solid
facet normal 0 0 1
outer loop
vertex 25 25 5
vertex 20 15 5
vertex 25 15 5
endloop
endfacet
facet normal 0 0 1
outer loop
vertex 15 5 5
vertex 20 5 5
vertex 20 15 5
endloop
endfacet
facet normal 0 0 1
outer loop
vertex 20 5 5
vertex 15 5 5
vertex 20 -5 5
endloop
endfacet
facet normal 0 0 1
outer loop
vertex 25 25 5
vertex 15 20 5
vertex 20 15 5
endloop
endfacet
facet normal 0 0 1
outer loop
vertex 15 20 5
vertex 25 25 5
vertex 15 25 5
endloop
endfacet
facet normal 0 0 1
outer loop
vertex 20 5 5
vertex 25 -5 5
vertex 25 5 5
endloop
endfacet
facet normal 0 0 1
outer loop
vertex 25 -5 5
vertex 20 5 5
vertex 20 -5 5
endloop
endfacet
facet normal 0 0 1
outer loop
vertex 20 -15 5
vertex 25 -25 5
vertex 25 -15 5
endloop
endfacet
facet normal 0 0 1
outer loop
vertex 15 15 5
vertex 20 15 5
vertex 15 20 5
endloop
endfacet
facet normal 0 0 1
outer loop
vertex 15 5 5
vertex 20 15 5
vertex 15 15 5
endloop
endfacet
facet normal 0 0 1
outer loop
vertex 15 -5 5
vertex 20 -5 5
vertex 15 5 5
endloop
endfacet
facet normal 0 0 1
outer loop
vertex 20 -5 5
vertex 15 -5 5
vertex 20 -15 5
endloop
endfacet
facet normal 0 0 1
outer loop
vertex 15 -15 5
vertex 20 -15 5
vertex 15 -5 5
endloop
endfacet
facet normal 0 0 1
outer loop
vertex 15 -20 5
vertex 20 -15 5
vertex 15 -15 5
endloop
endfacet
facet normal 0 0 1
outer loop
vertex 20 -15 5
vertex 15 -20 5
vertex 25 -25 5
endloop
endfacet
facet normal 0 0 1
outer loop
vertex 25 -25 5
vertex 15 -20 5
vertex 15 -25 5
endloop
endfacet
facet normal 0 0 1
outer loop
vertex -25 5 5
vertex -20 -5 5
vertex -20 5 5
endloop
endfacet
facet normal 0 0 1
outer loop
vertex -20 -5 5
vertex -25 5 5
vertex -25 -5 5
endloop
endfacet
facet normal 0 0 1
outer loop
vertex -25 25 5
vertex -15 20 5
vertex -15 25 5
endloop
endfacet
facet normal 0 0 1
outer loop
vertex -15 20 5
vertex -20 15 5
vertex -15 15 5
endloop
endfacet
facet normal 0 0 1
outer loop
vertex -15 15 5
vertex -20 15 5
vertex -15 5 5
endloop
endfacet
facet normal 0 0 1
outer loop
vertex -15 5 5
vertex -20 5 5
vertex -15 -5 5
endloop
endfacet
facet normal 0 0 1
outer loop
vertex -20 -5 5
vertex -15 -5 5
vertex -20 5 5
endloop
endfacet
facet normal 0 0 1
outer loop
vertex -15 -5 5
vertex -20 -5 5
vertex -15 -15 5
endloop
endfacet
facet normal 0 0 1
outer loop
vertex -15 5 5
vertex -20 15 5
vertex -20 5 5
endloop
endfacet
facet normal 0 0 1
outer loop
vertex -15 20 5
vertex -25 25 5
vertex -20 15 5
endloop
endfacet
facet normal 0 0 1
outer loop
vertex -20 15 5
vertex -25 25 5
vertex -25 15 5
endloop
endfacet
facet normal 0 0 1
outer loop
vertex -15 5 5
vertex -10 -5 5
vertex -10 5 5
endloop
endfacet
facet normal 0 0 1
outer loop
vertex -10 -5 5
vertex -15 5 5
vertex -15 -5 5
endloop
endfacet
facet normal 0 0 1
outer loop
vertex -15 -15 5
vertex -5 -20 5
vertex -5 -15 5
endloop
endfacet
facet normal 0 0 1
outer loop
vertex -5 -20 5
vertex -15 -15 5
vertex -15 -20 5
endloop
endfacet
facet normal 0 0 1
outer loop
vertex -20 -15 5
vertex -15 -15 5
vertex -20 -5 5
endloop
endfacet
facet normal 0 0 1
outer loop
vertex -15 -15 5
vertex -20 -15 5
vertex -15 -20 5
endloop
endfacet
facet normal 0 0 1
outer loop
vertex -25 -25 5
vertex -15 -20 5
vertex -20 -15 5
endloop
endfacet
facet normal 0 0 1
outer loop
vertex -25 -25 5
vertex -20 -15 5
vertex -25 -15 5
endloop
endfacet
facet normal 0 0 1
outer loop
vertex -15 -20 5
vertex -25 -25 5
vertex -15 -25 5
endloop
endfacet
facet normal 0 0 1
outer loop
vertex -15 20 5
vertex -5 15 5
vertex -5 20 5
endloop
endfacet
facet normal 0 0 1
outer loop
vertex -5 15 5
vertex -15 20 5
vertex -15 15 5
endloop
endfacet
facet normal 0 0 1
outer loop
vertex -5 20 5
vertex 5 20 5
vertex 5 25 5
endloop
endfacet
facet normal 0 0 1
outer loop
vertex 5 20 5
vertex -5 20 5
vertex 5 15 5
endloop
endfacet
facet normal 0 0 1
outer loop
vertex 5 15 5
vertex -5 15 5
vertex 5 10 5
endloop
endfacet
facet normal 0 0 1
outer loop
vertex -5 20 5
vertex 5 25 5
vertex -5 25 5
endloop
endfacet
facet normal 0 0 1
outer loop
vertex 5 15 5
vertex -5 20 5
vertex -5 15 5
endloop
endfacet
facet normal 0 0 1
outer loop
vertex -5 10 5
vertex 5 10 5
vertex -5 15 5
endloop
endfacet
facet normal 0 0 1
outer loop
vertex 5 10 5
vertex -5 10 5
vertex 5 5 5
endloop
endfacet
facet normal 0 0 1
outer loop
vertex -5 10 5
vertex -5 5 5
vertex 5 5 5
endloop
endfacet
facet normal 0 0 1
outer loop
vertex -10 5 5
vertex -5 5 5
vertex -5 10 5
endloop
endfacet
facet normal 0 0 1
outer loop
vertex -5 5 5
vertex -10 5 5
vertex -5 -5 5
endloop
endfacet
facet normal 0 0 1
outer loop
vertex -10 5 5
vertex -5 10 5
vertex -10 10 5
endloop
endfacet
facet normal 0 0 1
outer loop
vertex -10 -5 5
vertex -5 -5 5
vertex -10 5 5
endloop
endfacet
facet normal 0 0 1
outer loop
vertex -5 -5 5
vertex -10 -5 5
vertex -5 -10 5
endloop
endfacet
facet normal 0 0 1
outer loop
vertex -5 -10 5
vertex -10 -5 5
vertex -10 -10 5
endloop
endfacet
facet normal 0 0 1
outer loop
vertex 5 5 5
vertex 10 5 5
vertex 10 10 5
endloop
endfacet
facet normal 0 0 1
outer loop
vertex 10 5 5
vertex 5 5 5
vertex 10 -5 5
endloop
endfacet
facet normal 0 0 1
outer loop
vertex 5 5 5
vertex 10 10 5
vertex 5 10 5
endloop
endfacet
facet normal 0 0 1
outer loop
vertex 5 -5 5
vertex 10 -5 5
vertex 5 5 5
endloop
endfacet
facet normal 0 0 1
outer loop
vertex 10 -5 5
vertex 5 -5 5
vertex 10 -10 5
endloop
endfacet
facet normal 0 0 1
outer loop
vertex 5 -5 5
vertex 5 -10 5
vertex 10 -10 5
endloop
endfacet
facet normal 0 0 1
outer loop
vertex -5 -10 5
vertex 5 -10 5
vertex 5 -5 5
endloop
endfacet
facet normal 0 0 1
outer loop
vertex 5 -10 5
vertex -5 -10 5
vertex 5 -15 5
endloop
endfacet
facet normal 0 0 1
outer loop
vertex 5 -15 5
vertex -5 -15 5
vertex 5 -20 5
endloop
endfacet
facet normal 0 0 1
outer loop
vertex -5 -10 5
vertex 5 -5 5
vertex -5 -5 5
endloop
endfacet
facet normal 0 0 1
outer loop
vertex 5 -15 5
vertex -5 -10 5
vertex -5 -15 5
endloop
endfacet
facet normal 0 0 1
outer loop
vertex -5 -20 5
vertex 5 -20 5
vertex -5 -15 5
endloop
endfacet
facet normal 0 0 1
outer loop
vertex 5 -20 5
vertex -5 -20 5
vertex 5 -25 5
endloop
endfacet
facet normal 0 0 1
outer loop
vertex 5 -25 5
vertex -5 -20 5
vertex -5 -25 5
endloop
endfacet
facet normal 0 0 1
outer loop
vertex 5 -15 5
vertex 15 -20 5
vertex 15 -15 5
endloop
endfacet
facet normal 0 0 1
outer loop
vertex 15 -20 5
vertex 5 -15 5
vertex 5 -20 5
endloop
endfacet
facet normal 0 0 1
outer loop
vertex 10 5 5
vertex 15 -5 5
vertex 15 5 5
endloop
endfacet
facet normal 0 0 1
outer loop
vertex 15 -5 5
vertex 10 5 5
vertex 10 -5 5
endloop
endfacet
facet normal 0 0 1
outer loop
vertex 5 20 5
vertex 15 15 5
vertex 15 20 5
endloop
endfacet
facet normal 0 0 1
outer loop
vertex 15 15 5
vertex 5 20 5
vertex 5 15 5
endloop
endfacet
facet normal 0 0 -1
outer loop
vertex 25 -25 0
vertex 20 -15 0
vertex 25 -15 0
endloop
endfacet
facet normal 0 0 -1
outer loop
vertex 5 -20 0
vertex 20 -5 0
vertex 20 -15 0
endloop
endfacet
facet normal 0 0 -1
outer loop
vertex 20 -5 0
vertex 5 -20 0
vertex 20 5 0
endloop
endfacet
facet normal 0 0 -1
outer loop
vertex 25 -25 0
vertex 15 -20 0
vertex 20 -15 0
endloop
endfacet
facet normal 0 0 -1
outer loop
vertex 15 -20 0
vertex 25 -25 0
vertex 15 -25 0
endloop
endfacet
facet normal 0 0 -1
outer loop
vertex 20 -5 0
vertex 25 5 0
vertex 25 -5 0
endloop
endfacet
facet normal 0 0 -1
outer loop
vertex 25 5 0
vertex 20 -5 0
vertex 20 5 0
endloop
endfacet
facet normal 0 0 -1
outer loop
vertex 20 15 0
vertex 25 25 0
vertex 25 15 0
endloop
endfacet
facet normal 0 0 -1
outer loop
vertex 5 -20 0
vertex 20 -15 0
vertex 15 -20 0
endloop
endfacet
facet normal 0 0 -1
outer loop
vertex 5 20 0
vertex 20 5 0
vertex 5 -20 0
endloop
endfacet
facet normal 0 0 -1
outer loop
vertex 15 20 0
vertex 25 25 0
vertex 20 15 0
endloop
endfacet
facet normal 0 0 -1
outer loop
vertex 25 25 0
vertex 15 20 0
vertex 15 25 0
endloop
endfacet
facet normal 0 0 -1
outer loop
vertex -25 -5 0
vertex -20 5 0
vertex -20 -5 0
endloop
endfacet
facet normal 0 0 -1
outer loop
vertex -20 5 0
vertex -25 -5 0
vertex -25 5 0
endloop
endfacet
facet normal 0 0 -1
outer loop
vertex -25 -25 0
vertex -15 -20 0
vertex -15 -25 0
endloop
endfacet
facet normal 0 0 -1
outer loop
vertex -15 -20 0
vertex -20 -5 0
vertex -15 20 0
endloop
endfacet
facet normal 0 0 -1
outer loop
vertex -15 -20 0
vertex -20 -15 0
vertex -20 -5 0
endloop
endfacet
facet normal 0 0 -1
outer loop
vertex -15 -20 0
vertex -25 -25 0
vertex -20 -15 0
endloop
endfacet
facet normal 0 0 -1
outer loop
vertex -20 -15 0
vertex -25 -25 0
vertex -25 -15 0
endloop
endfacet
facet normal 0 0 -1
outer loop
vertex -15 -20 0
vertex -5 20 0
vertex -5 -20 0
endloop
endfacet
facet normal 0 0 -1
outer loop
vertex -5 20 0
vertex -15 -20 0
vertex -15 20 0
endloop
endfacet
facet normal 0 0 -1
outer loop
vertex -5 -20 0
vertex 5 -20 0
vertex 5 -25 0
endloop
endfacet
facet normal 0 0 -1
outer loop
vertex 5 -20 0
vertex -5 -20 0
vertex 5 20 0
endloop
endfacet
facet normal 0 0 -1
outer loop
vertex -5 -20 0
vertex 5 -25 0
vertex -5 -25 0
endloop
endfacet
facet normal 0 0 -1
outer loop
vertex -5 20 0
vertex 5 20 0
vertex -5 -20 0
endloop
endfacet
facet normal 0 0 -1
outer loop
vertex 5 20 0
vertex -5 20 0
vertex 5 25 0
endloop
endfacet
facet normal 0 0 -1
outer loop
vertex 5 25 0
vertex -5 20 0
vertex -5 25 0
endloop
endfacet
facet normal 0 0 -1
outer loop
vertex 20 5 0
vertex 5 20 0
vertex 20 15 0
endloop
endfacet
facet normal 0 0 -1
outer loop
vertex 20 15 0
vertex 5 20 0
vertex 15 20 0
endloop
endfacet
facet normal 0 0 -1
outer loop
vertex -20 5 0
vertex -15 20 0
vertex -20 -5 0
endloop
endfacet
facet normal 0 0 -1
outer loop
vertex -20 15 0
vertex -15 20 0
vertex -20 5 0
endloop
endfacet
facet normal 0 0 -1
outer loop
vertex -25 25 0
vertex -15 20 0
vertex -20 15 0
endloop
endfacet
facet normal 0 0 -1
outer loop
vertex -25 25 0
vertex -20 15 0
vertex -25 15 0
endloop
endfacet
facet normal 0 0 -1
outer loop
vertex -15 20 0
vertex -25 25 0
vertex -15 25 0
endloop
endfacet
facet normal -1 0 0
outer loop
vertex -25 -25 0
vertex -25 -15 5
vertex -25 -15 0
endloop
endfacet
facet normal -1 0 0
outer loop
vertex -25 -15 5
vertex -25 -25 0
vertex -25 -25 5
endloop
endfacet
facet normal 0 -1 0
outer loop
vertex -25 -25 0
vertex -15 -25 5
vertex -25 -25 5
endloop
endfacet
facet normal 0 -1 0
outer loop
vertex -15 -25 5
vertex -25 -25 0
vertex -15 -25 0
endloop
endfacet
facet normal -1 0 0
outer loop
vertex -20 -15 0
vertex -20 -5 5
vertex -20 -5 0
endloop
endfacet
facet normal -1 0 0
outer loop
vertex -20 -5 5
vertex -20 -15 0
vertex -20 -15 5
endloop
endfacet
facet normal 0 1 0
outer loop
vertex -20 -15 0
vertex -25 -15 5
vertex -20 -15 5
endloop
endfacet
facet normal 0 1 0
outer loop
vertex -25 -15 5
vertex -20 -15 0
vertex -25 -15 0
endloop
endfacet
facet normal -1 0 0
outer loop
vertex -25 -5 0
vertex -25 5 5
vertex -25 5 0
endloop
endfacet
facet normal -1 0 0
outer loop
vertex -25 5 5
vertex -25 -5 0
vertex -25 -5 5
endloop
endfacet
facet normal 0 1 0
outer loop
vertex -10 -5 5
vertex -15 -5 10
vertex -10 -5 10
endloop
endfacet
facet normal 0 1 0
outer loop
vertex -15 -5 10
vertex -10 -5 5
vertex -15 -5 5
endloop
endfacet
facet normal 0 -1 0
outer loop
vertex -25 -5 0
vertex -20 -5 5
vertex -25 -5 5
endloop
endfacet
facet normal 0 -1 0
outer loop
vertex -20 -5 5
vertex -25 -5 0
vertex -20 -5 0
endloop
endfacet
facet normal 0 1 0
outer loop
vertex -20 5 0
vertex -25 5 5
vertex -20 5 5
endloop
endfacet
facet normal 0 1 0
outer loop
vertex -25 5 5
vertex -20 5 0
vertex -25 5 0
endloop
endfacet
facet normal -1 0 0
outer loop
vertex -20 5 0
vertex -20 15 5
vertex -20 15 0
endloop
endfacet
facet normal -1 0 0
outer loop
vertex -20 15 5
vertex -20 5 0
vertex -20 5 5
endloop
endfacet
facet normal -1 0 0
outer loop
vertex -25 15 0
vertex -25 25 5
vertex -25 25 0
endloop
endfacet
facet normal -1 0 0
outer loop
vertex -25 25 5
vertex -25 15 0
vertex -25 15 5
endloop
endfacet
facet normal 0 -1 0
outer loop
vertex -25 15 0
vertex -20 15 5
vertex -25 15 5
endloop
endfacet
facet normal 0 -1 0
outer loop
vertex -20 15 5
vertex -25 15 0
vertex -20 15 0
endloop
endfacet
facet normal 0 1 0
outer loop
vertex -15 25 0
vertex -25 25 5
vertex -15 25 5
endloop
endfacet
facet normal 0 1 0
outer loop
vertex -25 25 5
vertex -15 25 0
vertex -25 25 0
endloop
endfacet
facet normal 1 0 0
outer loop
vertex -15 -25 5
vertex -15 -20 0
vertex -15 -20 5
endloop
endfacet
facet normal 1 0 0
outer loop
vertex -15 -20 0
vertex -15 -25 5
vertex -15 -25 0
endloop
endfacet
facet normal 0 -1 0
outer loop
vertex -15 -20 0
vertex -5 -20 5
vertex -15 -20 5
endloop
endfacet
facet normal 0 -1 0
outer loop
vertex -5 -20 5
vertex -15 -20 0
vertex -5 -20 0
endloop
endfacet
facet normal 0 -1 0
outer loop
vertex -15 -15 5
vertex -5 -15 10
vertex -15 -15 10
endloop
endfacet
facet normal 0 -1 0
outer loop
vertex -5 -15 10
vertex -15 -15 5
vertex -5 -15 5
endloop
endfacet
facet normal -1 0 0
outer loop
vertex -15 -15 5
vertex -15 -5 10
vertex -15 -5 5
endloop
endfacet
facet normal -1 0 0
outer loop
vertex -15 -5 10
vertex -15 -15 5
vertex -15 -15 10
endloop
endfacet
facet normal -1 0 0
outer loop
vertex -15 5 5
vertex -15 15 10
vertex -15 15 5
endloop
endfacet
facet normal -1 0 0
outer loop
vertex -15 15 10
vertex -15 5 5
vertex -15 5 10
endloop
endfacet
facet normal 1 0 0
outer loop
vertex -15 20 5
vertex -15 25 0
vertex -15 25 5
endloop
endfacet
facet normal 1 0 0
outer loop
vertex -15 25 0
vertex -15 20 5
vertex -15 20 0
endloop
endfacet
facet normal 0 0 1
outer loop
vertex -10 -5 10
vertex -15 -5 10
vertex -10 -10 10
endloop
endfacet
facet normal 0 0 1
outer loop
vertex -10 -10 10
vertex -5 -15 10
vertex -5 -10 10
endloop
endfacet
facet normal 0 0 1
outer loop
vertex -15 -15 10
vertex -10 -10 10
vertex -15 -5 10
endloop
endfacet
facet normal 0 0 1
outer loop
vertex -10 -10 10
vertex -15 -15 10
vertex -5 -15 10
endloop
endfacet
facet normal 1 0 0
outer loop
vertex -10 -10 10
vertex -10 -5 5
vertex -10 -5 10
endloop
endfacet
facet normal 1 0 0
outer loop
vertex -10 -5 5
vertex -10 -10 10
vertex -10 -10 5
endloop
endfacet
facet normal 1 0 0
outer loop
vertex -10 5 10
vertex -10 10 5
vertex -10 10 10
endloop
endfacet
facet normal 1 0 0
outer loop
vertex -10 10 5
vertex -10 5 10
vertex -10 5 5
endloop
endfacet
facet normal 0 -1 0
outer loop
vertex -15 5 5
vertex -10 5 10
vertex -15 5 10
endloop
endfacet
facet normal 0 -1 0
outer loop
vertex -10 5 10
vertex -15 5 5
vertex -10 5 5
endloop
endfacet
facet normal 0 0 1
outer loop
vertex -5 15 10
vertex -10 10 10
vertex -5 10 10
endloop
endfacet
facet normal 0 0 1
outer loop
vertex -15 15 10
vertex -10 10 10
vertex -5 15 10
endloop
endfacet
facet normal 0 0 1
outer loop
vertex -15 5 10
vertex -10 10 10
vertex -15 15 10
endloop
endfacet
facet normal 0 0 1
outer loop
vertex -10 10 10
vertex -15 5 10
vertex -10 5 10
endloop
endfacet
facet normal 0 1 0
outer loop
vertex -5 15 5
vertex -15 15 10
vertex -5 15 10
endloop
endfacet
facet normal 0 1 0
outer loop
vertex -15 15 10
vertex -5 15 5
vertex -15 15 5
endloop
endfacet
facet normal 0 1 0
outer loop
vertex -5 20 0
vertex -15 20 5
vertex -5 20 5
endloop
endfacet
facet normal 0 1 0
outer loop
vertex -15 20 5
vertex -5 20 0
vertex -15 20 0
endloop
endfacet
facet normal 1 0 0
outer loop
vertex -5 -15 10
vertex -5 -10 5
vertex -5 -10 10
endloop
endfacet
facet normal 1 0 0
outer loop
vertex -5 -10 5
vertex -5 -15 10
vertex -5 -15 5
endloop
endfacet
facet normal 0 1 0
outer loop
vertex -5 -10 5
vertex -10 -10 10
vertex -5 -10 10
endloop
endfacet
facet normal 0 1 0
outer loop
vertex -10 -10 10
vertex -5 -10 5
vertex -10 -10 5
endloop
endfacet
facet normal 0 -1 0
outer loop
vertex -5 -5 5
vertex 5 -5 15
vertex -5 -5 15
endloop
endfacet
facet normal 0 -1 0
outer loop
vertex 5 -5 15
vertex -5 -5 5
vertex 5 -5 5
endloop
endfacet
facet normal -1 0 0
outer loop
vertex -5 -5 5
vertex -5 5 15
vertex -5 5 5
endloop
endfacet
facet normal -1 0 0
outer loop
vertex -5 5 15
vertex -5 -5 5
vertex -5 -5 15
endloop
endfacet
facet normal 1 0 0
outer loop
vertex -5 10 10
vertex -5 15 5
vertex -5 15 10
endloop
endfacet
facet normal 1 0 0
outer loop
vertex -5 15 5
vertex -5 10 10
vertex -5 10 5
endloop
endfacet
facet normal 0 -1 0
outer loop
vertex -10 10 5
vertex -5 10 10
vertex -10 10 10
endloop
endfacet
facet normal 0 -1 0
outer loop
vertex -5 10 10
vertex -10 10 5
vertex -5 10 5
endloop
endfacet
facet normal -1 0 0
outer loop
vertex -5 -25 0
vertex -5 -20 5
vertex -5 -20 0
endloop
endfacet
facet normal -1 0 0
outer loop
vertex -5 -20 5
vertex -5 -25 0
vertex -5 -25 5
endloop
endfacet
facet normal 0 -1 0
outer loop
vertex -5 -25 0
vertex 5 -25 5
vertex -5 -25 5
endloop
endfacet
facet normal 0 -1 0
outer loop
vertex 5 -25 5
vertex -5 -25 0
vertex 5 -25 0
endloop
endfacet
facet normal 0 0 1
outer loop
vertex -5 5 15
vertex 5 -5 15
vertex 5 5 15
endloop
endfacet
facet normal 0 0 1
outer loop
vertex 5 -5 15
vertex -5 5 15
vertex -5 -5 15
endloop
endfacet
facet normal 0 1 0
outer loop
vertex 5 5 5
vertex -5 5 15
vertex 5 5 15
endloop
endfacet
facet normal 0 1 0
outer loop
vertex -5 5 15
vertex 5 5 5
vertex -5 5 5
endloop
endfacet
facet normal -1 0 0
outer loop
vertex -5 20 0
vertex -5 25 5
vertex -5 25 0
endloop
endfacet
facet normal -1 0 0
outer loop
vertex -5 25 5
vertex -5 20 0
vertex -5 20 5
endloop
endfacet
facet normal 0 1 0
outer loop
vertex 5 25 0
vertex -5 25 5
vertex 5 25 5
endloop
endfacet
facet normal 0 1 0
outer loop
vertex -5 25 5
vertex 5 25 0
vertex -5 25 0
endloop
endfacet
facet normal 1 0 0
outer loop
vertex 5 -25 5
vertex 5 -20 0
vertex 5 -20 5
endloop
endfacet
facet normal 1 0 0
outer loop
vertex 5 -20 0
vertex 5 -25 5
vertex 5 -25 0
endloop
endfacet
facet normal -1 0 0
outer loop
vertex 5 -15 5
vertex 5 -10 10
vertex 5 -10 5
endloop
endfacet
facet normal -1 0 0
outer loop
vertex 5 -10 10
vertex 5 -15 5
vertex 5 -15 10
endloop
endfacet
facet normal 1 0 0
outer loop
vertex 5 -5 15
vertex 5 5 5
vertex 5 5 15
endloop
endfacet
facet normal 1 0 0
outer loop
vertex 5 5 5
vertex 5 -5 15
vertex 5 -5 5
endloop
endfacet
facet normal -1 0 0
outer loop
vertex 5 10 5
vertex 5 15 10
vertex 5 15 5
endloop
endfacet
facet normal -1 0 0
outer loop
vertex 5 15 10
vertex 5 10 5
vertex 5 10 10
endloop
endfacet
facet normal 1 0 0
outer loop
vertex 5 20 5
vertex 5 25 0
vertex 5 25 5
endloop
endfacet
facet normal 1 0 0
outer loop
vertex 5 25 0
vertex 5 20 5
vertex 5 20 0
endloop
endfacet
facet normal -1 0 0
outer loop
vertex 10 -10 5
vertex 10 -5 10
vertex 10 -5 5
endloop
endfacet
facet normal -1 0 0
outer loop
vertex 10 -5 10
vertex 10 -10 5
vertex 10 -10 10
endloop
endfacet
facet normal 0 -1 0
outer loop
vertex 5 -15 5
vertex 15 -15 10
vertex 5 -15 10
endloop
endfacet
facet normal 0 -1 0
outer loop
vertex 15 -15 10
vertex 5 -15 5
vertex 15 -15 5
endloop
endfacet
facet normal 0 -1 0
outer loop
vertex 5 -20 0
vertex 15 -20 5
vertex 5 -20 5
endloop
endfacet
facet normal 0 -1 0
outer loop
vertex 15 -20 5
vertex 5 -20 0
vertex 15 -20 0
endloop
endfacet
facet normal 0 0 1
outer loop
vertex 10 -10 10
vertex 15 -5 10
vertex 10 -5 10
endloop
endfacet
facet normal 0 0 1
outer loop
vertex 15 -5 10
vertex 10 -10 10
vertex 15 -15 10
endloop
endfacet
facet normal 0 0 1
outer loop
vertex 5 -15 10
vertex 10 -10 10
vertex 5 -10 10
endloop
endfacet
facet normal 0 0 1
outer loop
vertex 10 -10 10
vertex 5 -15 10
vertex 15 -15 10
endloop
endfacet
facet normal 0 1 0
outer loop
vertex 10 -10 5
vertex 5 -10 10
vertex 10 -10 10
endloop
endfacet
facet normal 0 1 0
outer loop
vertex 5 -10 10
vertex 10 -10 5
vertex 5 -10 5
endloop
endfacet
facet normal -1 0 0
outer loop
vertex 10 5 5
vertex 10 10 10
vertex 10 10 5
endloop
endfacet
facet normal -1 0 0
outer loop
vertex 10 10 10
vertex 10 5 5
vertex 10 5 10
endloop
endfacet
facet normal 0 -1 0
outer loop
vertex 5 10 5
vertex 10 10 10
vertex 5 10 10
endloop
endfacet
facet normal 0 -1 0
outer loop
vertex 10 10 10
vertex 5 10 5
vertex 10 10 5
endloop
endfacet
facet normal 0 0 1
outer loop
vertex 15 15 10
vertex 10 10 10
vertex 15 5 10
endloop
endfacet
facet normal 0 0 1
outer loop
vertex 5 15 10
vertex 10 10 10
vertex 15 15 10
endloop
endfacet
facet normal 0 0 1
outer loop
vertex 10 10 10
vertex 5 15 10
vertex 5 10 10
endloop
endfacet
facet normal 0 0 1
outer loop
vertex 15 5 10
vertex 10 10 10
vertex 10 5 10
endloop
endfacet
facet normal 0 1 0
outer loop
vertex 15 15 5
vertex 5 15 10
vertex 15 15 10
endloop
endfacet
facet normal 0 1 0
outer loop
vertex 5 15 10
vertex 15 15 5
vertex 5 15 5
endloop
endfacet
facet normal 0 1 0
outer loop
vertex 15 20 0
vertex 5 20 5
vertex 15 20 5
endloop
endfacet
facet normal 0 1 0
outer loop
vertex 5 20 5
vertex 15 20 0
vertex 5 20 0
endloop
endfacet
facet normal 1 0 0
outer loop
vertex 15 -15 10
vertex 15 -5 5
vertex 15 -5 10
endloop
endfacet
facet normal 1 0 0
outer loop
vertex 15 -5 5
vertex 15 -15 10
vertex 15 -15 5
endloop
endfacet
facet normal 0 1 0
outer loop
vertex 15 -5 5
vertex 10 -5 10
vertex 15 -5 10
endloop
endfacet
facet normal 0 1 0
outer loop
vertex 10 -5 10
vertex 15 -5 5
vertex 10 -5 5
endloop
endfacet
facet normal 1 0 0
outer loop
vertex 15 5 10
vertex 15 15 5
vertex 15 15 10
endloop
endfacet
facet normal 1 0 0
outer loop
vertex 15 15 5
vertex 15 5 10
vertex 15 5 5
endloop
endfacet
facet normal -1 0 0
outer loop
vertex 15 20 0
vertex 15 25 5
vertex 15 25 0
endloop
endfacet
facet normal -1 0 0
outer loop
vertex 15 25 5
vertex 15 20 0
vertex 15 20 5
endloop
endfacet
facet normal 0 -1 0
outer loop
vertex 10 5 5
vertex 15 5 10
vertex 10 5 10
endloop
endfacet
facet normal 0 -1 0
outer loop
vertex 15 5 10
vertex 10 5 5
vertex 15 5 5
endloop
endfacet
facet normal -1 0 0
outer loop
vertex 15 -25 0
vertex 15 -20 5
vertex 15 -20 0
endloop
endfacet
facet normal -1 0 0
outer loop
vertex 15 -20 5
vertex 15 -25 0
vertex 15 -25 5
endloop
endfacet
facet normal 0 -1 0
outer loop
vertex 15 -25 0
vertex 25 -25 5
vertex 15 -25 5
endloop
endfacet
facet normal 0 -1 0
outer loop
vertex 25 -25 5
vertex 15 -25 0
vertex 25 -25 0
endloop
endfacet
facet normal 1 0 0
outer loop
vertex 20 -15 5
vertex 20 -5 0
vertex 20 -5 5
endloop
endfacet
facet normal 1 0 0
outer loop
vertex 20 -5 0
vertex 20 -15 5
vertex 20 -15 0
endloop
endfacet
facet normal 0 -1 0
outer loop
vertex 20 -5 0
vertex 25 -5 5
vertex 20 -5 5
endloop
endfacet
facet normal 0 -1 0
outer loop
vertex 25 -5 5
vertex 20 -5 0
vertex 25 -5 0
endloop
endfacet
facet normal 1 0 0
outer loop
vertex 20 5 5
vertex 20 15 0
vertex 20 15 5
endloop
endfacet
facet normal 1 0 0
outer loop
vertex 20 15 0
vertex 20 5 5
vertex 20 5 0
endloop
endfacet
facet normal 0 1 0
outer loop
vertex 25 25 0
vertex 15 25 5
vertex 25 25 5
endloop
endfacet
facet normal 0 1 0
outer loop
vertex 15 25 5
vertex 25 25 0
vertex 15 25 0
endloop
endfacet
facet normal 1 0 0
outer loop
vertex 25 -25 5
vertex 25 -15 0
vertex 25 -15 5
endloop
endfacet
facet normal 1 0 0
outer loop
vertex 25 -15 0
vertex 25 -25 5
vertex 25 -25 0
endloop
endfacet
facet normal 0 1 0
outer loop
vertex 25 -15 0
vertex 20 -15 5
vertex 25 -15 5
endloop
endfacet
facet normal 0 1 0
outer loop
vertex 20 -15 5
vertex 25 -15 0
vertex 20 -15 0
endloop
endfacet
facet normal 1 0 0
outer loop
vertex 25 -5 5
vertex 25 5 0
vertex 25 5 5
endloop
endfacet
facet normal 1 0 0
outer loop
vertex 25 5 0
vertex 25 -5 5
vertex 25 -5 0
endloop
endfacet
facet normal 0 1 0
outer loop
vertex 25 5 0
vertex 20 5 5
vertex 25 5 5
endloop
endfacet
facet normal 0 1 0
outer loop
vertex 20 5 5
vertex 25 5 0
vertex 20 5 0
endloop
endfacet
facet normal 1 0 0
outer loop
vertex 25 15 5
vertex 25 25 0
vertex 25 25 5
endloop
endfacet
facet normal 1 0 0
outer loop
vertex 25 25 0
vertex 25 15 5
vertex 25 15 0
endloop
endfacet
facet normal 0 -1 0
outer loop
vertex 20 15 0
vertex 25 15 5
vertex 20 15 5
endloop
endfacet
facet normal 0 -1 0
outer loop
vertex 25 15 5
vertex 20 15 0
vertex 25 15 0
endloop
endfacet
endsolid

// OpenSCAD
/*
Height Map Example
Tony Buser <tbuser@gmail.com>
http://tonybuser.com
http://creativecommons.org/licenses/by/3.0/

Can also dynamically run this by passing an array on the command line:

/Applications/OpenSCAD.app/Contents/MacOS/OpenSCAD -m make -D bitmap=[2,2,2,0,1,3,2,2,2] -D row_size=3 -s height_map.stl height_map.scad
*/

use <MCAD/bitmap/bitmap.scad> ;

block_size = 5;
height = 5;

row_size = 10; // 10x10 pixels
bitmap = [
	1,1,0,0,1,1,0,0,1,1,
	1,1,1,1,1,1,1,1,1,1,
	0,1,2,2,1,1,2,2,1,0,
	0,1,2,1,1,1,1,2,1,0,
	1,1,1,1,3,3,1,1,1,1,
	1,1,1,1,3,3,1,1,1,1,
	0,1,2,1,1,1,1,2,1,0,
	0,1,2,2,1,1,2,2,1,0,
	1,1,1,1,1,1,1,1,1,1,
	1,1,0,0,1,1,0,0,1,1
];

bitmap(bitmap, block_size, height, row_size);
